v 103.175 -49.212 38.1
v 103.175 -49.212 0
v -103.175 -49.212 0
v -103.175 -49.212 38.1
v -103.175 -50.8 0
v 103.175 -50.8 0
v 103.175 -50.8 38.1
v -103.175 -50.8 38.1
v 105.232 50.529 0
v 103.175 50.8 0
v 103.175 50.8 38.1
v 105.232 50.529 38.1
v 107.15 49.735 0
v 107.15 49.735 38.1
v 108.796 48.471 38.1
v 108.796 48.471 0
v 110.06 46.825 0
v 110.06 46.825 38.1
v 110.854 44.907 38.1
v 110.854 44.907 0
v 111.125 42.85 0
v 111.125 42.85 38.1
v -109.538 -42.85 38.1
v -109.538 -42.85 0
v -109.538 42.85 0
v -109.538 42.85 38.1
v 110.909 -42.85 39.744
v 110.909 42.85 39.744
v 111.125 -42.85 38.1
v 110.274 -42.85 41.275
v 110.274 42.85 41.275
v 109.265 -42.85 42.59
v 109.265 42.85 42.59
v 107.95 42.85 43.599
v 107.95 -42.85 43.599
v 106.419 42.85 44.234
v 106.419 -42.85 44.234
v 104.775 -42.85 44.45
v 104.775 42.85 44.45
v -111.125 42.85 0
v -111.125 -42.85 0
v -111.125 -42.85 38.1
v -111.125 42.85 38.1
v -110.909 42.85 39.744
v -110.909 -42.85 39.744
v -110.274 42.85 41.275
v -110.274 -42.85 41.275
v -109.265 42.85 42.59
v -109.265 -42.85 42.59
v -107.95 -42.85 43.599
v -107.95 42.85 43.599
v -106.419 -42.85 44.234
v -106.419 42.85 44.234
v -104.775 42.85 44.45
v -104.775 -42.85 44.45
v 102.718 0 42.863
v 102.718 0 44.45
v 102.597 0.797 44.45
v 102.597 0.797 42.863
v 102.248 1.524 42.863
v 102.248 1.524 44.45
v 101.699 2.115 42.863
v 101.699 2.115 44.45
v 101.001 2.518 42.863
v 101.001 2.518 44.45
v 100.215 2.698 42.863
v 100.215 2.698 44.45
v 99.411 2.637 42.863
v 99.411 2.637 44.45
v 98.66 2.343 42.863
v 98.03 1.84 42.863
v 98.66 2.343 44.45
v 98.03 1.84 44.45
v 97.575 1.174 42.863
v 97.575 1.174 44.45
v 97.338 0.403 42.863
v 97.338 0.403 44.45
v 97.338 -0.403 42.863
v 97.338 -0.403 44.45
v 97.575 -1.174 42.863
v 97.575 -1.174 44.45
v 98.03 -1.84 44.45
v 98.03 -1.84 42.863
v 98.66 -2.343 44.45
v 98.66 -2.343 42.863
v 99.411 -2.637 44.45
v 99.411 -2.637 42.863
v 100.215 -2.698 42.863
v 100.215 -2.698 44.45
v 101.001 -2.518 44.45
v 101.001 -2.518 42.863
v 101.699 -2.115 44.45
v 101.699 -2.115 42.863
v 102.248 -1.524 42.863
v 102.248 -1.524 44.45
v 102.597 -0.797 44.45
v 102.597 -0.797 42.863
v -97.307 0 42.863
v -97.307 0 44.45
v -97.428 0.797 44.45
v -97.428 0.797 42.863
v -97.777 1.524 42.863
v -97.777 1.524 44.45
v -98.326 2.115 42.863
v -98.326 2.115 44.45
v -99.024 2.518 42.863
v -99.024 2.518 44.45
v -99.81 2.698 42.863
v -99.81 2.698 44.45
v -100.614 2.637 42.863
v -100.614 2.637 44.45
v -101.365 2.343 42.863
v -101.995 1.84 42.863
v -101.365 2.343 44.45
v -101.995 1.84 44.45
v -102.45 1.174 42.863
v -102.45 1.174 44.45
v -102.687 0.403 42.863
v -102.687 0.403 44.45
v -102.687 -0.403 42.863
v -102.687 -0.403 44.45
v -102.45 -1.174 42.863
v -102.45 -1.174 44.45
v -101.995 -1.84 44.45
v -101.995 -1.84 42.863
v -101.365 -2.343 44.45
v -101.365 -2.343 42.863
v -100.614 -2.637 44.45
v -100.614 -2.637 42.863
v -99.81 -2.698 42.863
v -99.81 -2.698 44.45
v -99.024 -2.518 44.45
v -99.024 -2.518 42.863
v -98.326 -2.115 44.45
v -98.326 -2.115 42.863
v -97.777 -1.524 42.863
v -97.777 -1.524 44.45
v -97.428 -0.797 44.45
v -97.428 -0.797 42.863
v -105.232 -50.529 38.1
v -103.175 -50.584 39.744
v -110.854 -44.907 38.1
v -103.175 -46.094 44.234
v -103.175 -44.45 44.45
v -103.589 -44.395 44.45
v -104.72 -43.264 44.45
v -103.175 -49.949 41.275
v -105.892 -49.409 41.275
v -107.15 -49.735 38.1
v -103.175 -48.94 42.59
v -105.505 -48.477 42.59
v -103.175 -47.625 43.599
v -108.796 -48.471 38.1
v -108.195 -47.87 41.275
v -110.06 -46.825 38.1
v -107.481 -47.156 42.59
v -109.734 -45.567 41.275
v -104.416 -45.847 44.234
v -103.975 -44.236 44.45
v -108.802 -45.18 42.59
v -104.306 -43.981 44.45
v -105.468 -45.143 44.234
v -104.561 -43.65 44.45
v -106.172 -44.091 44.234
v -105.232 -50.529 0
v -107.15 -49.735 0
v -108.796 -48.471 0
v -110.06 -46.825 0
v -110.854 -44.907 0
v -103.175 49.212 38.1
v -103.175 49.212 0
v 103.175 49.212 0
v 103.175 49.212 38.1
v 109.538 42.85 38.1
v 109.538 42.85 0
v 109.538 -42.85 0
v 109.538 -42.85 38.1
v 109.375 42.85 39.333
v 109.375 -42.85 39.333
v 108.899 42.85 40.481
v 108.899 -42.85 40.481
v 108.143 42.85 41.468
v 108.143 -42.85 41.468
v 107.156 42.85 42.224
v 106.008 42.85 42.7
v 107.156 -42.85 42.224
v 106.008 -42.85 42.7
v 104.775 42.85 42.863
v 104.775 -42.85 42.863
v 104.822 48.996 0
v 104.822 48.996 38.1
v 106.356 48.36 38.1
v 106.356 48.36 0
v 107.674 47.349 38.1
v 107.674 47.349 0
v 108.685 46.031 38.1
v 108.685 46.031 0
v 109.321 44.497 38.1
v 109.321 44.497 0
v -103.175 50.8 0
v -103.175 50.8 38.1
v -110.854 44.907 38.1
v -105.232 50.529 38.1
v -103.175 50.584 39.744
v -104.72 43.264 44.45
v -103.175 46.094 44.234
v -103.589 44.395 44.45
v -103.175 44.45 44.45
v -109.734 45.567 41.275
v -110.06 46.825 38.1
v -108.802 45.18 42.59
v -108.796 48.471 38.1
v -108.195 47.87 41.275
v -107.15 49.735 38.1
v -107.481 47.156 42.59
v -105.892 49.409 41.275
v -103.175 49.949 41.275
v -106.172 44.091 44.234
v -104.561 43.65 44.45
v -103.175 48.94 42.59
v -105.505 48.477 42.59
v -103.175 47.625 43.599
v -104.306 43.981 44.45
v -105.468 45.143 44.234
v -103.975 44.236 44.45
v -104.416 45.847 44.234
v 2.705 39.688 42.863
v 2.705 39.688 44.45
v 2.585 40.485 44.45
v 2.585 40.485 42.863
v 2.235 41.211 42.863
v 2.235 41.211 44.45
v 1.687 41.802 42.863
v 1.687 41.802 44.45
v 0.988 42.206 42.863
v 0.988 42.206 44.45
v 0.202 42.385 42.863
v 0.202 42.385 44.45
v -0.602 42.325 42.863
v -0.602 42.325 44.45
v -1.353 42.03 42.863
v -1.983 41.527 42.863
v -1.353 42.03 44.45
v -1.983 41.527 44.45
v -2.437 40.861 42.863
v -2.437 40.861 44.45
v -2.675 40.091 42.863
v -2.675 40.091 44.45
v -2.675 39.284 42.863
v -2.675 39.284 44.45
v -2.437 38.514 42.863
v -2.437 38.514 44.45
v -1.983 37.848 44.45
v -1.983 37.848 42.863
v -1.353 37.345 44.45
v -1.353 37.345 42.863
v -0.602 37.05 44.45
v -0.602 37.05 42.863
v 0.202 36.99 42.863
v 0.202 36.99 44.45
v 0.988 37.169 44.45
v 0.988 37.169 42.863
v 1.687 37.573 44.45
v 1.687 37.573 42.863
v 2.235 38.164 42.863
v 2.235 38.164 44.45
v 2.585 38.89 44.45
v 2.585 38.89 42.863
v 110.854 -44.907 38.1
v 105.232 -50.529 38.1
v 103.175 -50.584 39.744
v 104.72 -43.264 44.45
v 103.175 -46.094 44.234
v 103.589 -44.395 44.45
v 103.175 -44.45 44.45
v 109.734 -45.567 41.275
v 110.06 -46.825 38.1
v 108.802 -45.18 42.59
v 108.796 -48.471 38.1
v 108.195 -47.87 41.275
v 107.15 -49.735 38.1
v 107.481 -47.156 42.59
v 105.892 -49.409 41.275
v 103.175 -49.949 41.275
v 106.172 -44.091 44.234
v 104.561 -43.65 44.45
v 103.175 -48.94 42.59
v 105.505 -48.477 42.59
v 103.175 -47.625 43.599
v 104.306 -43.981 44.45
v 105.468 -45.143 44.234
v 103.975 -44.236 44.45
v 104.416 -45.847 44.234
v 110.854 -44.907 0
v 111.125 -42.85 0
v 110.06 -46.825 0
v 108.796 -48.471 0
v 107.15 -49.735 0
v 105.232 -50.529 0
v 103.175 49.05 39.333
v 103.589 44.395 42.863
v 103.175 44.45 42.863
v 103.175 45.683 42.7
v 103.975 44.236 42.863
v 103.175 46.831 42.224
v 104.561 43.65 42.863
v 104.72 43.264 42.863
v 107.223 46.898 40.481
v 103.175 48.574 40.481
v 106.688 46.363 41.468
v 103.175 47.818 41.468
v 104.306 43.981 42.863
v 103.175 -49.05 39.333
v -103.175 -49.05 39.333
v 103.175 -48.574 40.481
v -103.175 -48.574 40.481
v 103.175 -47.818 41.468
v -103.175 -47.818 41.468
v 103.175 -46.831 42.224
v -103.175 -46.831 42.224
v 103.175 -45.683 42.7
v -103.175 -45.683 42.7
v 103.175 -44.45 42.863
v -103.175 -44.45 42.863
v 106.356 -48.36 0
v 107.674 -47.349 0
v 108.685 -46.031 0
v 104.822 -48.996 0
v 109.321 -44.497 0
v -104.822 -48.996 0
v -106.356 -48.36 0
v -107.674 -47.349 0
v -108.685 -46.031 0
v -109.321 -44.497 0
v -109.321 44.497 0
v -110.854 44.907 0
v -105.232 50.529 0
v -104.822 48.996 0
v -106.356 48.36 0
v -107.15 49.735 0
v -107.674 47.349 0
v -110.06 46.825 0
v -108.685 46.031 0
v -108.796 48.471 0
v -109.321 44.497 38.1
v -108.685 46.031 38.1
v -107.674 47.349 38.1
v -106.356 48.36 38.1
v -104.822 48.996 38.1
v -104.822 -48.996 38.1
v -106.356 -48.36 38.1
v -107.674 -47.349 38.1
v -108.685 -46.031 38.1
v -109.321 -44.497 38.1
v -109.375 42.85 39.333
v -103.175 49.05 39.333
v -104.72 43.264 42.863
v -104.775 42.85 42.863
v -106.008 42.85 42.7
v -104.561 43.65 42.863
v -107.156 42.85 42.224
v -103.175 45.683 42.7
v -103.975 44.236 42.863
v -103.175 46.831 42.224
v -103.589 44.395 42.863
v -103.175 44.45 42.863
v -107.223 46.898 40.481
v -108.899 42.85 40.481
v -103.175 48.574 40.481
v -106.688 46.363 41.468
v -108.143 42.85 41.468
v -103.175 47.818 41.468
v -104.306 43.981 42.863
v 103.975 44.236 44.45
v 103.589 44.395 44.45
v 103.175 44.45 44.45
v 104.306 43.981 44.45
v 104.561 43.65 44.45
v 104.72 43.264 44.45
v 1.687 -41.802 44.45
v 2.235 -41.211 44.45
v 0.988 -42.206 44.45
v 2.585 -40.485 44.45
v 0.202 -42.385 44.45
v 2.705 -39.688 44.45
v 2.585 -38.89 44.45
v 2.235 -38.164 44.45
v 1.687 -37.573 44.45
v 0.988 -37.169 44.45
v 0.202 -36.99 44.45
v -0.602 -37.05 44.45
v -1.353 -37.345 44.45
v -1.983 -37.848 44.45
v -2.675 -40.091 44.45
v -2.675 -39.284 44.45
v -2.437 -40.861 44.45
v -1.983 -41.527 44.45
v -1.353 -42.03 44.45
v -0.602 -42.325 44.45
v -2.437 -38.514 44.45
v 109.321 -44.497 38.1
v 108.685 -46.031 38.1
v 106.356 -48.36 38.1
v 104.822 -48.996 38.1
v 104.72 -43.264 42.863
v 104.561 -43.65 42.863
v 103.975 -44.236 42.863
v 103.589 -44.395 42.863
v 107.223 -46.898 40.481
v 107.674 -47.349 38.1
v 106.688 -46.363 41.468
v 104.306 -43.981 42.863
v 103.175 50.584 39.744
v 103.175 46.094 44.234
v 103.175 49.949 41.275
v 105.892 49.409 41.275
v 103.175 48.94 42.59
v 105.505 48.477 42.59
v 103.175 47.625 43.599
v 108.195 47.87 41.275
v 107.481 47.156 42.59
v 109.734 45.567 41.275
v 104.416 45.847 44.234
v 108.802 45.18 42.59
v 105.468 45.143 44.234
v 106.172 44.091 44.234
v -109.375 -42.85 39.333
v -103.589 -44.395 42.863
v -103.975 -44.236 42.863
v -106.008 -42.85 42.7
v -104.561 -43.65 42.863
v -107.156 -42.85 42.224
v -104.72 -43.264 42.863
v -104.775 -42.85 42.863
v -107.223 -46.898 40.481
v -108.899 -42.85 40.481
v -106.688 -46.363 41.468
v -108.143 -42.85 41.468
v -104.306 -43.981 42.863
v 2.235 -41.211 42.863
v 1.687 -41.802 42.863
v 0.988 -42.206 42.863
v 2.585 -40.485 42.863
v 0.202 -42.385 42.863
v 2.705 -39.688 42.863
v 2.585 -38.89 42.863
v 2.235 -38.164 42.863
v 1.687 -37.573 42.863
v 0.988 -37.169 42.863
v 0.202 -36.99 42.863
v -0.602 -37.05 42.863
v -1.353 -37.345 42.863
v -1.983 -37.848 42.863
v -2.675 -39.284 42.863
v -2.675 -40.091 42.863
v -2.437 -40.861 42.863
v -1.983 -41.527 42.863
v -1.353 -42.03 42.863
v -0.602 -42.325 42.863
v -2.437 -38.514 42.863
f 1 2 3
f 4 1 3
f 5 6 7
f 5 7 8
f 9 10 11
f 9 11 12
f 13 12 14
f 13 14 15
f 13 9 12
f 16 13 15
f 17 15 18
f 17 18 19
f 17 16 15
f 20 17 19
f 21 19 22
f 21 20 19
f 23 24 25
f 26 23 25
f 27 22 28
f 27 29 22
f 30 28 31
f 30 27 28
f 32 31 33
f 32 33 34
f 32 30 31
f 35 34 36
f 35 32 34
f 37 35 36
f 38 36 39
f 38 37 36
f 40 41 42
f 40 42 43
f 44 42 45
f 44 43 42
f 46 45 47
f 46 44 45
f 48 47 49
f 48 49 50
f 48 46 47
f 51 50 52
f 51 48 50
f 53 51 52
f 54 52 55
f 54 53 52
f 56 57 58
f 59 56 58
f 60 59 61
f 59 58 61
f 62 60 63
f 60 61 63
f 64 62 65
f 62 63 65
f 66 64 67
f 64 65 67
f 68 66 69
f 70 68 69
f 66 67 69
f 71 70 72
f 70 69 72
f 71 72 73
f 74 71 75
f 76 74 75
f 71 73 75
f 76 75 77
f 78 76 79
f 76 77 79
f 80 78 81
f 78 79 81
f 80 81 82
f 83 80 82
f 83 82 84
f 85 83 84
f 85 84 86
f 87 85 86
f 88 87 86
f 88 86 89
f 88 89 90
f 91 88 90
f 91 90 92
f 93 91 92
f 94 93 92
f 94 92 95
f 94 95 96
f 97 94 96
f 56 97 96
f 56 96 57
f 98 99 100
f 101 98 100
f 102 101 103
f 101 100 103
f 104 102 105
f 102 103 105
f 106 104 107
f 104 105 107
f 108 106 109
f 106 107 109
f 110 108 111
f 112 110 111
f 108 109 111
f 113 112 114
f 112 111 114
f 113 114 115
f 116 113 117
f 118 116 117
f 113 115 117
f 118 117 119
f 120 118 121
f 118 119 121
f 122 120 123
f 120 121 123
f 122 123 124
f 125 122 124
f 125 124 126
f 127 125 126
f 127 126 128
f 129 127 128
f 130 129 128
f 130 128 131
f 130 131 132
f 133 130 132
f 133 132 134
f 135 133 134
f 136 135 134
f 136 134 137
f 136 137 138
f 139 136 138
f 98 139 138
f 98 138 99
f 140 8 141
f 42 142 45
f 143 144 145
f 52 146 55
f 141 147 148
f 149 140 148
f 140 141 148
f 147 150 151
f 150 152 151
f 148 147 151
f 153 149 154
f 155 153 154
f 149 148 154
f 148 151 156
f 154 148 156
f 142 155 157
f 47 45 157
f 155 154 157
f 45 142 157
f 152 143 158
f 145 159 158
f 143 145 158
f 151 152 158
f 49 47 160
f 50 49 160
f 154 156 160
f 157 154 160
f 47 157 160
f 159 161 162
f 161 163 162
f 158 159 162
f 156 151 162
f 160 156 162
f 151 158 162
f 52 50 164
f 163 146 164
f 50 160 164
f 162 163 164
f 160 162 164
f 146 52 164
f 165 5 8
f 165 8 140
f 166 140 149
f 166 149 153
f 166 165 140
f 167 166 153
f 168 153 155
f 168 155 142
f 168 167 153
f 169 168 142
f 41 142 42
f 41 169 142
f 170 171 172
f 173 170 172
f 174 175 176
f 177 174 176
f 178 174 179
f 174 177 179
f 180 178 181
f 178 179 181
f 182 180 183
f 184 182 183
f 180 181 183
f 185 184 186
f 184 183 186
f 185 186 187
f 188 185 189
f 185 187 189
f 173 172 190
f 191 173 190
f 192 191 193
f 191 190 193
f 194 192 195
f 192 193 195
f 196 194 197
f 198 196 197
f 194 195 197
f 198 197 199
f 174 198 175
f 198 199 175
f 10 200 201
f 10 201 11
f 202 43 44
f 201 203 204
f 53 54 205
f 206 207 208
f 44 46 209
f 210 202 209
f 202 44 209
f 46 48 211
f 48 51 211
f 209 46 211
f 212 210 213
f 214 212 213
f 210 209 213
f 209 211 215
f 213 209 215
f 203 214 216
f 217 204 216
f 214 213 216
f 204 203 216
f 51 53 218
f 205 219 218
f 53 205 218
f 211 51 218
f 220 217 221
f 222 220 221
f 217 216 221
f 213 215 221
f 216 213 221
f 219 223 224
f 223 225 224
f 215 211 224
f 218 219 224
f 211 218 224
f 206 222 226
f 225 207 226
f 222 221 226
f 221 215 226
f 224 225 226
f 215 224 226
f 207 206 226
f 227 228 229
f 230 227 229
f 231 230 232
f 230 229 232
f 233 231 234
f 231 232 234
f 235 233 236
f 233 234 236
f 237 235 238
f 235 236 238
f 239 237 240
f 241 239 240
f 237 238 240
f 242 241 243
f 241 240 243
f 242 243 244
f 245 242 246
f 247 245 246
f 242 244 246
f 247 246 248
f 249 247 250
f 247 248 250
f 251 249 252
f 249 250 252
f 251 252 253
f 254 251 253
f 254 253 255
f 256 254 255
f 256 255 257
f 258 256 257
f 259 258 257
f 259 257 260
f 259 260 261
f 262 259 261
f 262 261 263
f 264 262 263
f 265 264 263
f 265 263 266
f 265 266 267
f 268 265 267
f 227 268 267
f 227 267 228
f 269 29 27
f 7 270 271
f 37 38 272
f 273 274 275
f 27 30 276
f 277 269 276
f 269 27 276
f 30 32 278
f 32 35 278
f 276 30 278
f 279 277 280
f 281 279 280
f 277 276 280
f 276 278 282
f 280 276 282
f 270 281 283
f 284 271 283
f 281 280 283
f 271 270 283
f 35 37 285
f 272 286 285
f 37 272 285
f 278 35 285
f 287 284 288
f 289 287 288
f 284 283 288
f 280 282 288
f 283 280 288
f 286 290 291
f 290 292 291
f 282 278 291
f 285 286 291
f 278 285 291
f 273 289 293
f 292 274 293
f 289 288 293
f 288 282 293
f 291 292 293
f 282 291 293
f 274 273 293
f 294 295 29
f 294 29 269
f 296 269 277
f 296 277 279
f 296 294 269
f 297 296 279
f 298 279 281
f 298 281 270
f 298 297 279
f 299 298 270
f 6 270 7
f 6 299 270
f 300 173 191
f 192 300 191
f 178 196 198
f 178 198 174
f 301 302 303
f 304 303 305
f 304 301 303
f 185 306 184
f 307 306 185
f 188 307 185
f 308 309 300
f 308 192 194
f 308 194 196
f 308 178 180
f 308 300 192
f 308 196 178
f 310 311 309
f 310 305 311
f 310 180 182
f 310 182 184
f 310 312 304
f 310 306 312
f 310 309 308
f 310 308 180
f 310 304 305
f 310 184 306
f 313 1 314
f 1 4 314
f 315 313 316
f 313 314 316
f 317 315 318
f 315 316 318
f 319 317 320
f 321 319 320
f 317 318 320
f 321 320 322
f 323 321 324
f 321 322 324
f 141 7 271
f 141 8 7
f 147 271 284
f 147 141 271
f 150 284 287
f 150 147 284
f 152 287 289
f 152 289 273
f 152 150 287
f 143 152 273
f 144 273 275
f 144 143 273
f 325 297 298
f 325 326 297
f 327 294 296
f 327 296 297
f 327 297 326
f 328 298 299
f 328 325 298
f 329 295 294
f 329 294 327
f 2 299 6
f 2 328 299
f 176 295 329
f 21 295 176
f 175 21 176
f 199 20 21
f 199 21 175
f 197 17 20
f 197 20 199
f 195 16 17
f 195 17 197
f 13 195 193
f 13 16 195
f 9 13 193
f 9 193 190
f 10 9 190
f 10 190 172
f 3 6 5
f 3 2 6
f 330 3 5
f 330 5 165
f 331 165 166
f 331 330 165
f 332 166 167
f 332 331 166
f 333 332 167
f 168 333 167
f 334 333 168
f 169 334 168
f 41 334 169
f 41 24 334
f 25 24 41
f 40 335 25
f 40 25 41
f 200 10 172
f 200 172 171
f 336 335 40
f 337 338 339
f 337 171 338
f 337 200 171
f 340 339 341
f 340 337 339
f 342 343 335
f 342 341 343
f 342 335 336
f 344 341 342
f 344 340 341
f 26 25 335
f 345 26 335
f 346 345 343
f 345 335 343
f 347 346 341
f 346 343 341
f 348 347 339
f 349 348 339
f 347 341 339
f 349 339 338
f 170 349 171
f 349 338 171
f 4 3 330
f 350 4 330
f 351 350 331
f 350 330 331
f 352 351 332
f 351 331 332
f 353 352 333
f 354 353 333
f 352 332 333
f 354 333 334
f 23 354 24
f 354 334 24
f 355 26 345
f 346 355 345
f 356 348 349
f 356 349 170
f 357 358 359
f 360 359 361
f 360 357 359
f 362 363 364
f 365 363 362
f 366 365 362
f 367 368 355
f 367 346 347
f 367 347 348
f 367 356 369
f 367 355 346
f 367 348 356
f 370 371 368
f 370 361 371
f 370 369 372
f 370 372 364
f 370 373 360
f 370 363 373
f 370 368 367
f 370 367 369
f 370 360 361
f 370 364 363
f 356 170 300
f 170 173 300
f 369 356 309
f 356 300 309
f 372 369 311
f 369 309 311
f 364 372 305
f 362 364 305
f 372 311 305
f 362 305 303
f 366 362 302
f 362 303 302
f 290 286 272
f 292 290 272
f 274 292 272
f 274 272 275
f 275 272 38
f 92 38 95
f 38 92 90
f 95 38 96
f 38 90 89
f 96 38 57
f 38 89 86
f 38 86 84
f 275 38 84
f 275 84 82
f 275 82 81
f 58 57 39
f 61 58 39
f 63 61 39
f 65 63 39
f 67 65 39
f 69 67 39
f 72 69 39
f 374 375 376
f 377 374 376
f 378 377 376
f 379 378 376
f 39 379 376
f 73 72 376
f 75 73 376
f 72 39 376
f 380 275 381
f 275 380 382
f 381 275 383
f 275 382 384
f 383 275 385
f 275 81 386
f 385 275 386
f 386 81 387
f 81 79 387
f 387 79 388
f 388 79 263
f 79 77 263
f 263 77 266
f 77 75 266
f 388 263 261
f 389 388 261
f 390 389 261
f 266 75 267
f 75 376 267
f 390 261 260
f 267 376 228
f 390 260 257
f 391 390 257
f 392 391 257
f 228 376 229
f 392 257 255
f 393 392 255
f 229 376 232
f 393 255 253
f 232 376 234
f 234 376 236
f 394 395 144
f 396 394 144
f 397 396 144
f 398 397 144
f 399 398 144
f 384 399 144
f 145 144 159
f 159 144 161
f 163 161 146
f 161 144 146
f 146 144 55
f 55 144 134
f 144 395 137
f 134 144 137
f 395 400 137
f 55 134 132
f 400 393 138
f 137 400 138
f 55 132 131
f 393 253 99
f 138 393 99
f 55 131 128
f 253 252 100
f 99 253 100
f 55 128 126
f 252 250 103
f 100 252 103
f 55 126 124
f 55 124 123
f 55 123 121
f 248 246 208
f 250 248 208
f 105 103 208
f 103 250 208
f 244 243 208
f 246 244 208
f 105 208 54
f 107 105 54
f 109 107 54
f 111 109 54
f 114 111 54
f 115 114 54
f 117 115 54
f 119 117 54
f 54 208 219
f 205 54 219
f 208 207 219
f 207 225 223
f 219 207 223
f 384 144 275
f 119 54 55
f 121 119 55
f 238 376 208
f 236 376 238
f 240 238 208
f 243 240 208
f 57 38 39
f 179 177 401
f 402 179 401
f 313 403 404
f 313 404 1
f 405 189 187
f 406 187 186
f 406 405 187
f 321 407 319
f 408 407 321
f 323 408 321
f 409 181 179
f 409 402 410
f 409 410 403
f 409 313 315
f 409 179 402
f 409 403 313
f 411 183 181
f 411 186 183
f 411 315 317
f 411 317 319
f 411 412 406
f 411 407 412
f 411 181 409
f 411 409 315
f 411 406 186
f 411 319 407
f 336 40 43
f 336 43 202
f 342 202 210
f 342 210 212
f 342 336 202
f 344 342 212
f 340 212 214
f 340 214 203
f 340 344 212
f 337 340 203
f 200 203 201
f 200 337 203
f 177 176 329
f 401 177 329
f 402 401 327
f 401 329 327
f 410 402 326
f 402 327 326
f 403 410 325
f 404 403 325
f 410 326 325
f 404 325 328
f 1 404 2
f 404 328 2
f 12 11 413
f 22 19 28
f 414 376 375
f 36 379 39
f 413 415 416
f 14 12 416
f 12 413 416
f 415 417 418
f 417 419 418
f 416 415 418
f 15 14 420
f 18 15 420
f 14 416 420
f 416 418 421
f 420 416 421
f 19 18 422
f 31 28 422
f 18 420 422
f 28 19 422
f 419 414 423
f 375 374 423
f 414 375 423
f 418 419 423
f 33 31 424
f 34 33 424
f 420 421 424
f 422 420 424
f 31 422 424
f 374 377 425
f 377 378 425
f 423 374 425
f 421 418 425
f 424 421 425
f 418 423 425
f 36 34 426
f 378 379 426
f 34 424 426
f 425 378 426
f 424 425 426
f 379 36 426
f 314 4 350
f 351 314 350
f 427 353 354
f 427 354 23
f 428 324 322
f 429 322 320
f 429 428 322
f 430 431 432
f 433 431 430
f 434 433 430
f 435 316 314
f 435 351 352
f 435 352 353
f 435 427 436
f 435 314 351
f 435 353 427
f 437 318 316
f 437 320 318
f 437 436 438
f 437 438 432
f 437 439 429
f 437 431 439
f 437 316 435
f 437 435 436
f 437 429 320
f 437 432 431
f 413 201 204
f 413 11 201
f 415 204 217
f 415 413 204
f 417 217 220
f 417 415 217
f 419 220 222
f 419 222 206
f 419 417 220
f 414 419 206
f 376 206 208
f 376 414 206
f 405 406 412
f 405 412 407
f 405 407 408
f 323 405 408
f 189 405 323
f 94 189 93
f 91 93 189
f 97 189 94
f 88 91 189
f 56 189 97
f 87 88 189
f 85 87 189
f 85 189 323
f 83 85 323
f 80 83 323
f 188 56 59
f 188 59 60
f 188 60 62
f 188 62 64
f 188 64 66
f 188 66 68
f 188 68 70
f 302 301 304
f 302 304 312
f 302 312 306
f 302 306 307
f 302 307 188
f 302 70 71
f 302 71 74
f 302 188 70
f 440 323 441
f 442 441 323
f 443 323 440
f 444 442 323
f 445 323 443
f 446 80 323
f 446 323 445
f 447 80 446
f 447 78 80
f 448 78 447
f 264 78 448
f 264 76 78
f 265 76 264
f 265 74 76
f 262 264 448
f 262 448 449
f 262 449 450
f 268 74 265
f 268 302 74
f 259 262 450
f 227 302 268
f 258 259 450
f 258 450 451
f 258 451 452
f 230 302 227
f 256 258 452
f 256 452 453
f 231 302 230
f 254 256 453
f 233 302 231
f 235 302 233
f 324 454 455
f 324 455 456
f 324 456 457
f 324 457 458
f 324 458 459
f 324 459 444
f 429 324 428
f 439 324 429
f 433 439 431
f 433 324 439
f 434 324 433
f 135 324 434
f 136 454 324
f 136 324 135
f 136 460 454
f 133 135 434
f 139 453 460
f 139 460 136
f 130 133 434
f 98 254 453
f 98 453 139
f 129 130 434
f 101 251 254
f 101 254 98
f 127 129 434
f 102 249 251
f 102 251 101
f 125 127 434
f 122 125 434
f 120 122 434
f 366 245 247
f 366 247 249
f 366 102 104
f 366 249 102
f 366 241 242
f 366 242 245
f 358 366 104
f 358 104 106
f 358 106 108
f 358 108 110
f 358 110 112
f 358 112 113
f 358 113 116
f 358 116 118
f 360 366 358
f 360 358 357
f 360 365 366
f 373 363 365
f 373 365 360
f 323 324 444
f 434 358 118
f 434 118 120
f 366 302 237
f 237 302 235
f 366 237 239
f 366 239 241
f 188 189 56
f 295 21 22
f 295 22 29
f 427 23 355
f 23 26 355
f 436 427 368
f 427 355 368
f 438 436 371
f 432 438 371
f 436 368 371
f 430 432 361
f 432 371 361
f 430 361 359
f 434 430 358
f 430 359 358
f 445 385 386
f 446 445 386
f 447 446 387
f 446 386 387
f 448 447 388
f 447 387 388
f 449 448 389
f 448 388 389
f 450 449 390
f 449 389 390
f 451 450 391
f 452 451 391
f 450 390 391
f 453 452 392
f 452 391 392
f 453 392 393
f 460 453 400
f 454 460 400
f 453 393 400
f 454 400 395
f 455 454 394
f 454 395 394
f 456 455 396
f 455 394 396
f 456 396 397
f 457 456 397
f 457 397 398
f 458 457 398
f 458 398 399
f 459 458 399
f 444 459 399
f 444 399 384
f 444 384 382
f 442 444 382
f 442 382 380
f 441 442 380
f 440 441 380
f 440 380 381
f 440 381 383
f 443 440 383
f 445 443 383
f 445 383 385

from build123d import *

# Parameters (mm, degrees)
BOSS_EXTRUDE1_DEPTH = 44.45
FILLET1_R           = 6.35
SHELL1_T            = -1.5875
CUT_EXTRUDE1_REACH  = 132.02
SKETCH2_R           = 2.7051


with BuildPart() as part:
    # Sketch1 → Boss-Extrude1 (new body)
    with BuildSketch(Plane.XY):
        with BuildLine():
            Line((-103.1748, 50.8), (103.1748, 50.8))
            ThreePointArc((103.1748, 50.8), (108.796440332, 48.471440332), (111.125, 42.8498))
            Line((111.125, 42.8498), (111.125, -42.8498))
            ThreePointArc((111.125, -42.8498), (108.796440332, -48.471440332), (103.1748, -50.8))
            Line((103.1748, -50.8), (-103.1748, -50.8))
            ThreePointArc((-103.1748, -50.8), (-108.796440332, -48.471440332), (-111.125, -42.8498))
            Line((-111.125, -42.8498), (-111.125, 42.8498))
            ThreePointArc((-111.125, 42.8498), (-108.796440332, 48.471440332), (-103.1748, 50.8))
        make_face()
    extrude(amount=BOSS_EXTRUDE1_DEPTH)

    # Fillet1
    fillet1_edges = [part.edges().sort_by_distance(p)[0] for p in [
        (108.796440332, -48.471440332, 44.45),
        (111.125, 0, 44.45),
        (108.796440332, 48.471440332, 44.45),
        (0, 50.8, 44.45),
        (-108.796440332, 48.471440332, 44.45),
        (-111.125, 0, 44.45),
        (-108.796440332, -48.471440332, 44.45),
        (0, -50.8, 44.45),
    ]]
    fillet(fillet1_edges, radius=FILLET1_R)

    # Shell1
    shell1_openings = [part.faces().sort_by_distance(p)[0] for p in [
        (0, 0, 0),
    ]]
    offset(amount=SHELL1_T, openings=shell1_openings, kind=Kind.INTERSECTION)

    # Sketch2 → Cut-Extrude1 (cut, up to next)
    with BuildSketch(Plane.XY.offset(44.45), mode=Mode.PRIVATE) as cut_extrude1_sk1:
        with Locations((0, 39.6875)):
            Circle(SKETCH2_R)
    cut_extrude1_tool1 = extrude(cut_extrude1_sk1.sketch, amount=-CUT_EXTRUDE1_REACH, mode=Mode.PRIVATE) & part.part
    # Sketch2 → Cut-Extrude1 (cut, up to next)
    with BuildSketch(Plane.XY.offset(44.45), mode=Mode.PRIVATE) as cut_extrude1_sk2:
        with Locations((0, -39.6875)):
            Circle(SKETCH2_R)
    cut_extrude1_tool2 = extrude(cut_extrude1_sk2.sketch, amount=-CUT_EXTRUDE1_REACH, mode=Mode.PRIVATE) & part.part
    # Sketch2 → Cut-Extrude1 (cut, up to next)
    with BuildSketch(Plane.XY.offset(44.45), mode=Mode.PRIVATE) as cut_extrude1_sk3:
        with Locations((100.0125, 0)):
            Circle(SKETCH2_R)
    cut_extrude1_tool3 = extrude(cut_extrude1_sk3.sketch, amount=-CUT_EXTRUDE1_REACH, mode=Mode.PRIVATE) & part.part
    # Sketch2 → Cut-Extrude1 (cut, up to next)
    with BuildSketch(Plane.XY.offset(44.45), mode=Mode.PRIVATE) as cut_extrude1_sk4:
        with Locations((-100.0125, 0)):
            Circle(SKETCH2_R)
    cut_extrude1_tool4 = extrude(cut_extrude1_sk4.sketch, amount=-CUT_EXTRUDE1_REACH, mode=Mode.PRIVATE) & part.part
    add(cut_extrude1_tool1.solids().sort_by_distance((0, 39.6875, 44.45))[0], mode=Mode.SUBTRACT)
    add(cut_extrude1_tool2.solids().sort_by_distance((0, -39.6875, 44.45))[0], mode=Mode.SUBTRACT)
    add(cut_extrude1_tool3.solids().sort_by_distance((100.0125, 0, 44.45))[0], mode=Mode.SUBTRACT)
    add(cut_extrude1_tool4.solids().sort_by_distance((-100.0125, 0, 44.45))[0], mode=Mode.SUBTRACT)


solid = part.part
